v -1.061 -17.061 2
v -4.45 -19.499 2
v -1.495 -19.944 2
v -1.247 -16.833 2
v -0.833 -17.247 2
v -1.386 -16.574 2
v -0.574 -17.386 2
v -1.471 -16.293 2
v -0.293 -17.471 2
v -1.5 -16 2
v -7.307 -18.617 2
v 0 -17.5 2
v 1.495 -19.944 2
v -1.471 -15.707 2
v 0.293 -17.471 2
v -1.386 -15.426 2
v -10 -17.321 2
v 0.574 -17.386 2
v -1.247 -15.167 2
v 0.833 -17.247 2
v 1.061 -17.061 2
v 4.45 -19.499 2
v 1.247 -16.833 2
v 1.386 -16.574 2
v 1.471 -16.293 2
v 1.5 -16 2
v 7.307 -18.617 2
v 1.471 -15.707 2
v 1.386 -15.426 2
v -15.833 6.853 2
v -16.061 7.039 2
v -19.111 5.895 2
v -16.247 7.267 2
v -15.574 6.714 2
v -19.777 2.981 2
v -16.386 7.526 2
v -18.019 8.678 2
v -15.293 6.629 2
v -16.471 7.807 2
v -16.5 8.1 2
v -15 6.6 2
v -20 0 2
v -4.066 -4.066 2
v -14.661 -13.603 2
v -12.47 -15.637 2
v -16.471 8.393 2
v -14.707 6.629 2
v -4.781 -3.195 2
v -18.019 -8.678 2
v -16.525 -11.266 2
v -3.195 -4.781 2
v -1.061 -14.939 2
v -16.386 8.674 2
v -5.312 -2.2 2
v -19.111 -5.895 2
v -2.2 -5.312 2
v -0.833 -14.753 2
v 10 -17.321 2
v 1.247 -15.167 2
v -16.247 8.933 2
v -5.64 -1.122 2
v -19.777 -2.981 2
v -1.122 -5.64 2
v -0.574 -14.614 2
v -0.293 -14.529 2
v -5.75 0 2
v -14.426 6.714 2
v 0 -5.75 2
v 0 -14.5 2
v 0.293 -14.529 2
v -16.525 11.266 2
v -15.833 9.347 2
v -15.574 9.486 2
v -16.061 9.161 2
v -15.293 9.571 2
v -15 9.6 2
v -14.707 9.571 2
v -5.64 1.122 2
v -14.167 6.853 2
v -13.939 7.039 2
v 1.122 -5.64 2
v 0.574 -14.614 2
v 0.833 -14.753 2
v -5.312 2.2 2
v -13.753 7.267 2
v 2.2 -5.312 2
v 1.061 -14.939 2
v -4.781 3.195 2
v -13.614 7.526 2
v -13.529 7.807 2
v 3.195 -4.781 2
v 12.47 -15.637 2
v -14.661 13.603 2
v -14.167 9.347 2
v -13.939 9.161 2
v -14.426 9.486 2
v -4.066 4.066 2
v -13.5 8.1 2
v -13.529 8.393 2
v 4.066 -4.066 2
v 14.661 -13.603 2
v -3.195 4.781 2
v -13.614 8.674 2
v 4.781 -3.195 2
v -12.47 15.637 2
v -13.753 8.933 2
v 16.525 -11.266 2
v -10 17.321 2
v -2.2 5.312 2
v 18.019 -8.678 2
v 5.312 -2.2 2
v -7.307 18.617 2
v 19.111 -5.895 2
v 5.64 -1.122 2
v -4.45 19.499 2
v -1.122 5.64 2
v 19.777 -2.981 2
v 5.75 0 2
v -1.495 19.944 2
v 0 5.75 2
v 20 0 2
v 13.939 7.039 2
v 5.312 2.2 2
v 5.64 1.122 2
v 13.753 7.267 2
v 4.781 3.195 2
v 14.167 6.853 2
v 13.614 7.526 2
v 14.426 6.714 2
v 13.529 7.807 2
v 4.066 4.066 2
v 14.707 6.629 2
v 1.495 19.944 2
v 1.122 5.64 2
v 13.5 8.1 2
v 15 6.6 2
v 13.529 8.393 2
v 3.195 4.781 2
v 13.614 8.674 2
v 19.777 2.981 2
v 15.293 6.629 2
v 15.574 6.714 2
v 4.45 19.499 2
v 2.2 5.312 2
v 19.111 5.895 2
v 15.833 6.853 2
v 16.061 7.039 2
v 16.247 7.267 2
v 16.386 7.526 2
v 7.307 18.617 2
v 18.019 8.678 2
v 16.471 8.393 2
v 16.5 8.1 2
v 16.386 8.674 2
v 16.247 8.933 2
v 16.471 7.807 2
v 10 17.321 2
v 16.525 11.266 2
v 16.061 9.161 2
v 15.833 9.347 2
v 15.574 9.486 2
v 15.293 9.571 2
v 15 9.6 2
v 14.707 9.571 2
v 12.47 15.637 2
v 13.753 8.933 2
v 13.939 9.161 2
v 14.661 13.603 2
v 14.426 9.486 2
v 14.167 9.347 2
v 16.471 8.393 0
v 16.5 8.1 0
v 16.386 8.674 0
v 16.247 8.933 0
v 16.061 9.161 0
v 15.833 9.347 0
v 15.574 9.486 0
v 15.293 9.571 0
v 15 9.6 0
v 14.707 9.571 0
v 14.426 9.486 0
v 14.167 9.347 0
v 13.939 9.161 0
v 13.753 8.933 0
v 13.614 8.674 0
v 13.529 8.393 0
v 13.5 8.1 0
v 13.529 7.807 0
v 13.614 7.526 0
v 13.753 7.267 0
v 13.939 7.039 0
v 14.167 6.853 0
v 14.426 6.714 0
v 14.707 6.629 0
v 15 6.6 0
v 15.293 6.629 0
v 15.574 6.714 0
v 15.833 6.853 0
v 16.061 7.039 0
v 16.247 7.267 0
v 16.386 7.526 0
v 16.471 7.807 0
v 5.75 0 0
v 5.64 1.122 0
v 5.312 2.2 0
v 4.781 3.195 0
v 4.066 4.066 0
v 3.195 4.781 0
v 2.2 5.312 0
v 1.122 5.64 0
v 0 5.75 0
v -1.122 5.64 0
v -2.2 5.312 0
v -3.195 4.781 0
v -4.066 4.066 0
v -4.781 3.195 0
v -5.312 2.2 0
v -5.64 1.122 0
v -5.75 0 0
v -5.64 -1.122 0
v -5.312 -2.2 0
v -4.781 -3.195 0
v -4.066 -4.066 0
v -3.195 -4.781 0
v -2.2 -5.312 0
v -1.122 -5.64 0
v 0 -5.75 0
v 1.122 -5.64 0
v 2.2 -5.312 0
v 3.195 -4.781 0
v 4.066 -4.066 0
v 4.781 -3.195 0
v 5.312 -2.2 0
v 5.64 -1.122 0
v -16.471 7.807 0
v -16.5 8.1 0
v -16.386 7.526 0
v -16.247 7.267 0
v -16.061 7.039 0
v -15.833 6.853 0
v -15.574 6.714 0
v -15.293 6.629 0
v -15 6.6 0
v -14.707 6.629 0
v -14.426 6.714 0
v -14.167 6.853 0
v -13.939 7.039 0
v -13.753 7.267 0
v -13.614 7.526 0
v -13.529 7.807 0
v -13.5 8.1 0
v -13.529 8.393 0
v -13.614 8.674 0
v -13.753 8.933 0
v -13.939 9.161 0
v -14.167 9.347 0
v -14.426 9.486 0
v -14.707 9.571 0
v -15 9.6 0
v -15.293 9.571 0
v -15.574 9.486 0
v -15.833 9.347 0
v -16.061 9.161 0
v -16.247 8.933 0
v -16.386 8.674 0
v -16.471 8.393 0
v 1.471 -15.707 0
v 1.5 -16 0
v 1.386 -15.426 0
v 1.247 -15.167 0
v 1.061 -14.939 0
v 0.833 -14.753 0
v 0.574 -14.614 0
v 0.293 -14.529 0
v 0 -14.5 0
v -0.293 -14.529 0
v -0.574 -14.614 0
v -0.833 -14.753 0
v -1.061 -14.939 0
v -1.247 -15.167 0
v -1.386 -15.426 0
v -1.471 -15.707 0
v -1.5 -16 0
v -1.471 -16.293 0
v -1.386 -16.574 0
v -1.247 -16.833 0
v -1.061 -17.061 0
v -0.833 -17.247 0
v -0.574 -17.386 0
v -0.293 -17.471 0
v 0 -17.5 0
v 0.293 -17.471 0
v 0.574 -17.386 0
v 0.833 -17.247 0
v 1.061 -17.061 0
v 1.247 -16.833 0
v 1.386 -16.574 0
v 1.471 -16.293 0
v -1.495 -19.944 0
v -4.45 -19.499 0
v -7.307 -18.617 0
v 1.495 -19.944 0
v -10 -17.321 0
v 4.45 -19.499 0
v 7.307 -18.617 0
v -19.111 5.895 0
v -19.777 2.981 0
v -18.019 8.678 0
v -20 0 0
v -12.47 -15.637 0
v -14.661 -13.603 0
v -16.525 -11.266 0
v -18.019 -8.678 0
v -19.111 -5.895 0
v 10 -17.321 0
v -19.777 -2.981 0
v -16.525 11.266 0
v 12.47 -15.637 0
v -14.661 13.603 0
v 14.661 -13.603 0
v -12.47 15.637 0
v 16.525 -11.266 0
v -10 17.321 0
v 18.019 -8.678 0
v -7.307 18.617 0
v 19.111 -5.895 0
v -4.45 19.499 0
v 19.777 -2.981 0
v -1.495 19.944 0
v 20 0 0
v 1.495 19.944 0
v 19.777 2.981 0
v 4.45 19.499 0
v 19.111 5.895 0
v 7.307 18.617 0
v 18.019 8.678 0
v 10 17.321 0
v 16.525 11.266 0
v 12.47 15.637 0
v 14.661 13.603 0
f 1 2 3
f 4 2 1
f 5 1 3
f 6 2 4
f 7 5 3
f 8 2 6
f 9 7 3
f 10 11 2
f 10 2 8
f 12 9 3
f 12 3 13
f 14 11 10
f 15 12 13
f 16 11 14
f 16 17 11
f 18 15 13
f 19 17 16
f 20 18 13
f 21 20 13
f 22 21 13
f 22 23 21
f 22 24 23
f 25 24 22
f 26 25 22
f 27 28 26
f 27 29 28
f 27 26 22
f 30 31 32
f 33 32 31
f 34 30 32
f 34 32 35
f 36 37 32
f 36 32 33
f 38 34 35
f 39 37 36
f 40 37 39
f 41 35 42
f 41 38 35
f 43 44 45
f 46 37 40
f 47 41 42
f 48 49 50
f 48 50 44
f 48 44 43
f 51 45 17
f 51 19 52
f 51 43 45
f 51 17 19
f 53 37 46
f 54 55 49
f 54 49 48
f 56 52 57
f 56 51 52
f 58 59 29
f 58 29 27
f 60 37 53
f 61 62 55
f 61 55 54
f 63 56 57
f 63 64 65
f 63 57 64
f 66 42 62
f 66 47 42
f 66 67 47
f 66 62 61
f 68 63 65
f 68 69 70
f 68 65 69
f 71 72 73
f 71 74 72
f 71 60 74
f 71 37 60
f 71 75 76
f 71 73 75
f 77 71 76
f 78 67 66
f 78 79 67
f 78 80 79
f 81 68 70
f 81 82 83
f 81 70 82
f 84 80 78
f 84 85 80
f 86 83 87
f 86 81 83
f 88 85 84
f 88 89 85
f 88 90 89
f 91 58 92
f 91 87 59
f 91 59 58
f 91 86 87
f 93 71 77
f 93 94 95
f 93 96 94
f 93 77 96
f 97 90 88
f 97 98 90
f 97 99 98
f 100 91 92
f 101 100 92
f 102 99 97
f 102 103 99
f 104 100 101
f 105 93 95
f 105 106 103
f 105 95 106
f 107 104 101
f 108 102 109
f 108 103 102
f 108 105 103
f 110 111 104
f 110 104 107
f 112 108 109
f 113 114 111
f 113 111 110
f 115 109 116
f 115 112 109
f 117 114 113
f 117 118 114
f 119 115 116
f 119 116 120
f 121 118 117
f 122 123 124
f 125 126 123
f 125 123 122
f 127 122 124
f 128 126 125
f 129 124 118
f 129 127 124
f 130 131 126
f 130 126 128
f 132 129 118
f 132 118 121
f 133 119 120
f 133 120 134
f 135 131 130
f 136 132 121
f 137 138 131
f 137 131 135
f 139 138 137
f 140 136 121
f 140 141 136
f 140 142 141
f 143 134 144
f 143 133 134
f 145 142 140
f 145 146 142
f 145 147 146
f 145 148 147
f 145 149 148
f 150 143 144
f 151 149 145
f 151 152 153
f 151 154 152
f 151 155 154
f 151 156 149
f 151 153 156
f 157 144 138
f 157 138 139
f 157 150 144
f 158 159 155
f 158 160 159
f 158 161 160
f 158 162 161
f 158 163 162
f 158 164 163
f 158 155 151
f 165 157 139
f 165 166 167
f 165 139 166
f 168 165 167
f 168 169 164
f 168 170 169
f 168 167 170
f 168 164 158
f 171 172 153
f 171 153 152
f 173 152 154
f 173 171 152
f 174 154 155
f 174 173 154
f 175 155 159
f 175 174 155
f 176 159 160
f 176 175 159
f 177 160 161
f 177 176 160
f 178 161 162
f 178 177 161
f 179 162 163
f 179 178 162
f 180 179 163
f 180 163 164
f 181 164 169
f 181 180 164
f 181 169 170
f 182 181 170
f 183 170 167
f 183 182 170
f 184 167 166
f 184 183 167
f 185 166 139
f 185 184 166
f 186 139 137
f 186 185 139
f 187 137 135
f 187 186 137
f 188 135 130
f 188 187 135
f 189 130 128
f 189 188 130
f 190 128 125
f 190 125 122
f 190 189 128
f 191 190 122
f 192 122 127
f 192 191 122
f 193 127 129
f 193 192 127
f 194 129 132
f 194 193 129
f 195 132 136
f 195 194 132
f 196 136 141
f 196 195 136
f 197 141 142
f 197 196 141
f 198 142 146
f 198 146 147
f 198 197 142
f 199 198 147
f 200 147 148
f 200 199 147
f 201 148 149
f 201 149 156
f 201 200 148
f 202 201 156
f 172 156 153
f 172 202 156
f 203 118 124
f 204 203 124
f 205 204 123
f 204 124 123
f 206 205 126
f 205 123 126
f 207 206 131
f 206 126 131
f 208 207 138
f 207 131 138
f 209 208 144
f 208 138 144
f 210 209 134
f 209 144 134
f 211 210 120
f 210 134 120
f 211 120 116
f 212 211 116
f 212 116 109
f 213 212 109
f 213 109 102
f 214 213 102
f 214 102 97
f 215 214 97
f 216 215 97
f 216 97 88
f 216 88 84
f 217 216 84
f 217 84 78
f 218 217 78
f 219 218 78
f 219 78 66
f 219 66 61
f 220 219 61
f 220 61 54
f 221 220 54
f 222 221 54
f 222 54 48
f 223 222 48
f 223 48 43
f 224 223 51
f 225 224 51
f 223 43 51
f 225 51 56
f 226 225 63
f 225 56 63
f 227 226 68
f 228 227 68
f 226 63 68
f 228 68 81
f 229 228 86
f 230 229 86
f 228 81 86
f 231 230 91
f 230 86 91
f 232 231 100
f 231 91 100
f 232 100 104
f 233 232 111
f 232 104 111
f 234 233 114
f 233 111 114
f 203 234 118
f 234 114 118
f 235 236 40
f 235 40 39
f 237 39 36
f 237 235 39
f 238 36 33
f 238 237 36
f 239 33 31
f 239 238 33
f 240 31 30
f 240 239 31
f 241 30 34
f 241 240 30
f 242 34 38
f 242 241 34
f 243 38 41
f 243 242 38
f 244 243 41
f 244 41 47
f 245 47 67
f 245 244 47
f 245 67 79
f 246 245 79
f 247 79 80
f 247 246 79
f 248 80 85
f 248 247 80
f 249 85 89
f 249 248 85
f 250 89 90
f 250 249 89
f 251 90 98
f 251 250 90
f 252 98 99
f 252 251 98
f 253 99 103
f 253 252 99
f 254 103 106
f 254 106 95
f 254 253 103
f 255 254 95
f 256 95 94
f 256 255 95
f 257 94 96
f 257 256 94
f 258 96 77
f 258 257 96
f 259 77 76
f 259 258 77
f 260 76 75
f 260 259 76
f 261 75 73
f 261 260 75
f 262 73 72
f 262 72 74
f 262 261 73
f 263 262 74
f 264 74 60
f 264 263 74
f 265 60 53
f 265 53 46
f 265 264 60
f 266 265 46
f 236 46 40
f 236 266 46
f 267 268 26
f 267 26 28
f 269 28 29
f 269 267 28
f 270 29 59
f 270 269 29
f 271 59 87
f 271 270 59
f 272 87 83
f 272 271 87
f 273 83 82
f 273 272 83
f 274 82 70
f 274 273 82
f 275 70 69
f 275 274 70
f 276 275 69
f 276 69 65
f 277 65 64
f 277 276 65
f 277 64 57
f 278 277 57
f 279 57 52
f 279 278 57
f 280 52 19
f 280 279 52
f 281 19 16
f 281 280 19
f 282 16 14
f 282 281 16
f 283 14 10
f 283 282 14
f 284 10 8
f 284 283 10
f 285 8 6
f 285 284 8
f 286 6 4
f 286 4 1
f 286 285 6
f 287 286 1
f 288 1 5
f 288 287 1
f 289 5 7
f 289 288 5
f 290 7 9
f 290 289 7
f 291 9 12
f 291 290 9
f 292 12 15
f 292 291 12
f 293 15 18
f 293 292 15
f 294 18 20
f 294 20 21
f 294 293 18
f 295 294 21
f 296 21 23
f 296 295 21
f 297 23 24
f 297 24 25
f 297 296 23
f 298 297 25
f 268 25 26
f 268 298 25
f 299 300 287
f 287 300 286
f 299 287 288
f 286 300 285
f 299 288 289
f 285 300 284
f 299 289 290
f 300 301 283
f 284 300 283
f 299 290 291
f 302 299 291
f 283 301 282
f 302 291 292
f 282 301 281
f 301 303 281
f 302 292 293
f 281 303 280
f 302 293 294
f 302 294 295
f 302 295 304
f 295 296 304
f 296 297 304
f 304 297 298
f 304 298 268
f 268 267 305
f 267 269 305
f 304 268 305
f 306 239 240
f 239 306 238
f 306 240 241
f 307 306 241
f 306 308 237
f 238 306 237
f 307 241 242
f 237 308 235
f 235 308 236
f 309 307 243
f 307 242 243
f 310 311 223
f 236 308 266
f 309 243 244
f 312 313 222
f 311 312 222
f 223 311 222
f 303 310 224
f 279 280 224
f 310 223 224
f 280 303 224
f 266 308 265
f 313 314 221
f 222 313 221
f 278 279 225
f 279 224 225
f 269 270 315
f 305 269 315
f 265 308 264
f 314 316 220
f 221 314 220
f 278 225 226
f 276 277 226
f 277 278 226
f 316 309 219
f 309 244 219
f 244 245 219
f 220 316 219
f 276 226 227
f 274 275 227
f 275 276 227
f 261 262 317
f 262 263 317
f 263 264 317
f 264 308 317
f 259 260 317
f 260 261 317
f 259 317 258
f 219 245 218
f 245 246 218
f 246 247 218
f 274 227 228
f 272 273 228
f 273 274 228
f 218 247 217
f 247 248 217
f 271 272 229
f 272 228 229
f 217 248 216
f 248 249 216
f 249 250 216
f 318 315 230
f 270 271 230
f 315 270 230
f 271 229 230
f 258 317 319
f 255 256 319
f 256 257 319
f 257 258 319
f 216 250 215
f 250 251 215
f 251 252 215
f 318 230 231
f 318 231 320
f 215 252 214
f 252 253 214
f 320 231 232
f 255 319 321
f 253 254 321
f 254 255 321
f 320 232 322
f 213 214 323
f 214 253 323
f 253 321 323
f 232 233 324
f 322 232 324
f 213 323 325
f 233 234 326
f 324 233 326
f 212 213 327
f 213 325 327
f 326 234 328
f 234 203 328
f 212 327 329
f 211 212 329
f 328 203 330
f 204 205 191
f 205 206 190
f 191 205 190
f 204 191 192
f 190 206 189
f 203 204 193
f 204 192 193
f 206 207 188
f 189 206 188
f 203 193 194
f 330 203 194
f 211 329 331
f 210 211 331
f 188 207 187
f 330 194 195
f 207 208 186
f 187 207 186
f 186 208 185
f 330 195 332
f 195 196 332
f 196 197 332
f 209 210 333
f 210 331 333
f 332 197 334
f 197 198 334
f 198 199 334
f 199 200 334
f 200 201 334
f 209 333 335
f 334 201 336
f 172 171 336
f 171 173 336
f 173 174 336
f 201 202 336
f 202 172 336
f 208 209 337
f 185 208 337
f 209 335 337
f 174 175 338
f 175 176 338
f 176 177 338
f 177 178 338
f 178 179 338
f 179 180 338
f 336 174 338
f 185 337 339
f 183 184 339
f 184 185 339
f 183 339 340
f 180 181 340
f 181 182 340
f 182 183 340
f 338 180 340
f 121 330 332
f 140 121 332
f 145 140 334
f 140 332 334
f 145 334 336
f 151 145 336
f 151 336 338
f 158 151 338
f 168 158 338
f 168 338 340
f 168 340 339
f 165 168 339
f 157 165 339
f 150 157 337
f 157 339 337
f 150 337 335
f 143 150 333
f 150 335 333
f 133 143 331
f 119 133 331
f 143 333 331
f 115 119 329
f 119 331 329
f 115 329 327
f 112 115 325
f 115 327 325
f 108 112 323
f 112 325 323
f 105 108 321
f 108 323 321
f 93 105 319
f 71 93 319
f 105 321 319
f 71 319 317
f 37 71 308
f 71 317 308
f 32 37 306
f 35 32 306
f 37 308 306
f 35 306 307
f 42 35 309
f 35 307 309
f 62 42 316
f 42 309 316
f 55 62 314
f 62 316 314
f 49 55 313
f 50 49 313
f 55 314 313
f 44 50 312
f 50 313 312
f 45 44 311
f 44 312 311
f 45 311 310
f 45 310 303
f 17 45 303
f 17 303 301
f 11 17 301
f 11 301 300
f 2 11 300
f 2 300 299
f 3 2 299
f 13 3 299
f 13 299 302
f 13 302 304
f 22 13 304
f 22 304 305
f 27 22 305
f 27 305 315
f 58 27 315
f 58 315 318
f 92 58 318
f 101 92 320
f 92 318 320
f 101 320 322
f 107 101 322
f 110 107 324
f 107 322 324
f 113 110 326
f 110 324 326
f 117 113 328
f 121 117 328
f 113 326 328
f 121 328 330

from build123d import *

# Parameters (mm, degrees)
CROQUIS1_R              = 20
CROQUIS1_R_2            = 1.5
SALIENTE_EXTRUIR1_DEPTH = 2
CROQUIS2_R              = 5.75
CORTAR_EXTRUIR1_DEPTH   = 10


with BuildPart() as part:
    # Croquis1 → Saliente-Extruir1 (new body)
    with BuildSketch(Plane.XY):
        Circle(CROQUIS1_R)
        with Locations((15, 8.1)):
            Circle(CROQUIS1_R_2, mode=Mode.SUBTRACT)
        with Locations((0, -16)):
            Circle(CROQUIS1_R_2, mode=Mode.SUBTRACT)
        with Locations(Location((-15, 8.1, 0), (0, 0, 180))):
            Circle(CROQUIS1_R_2, mode=Mode.SUBTRACT)
    extrude(amount=SALIENTE_EXTRUIR1_DEPTH)

    # Croquis2 → Cortar-Extruir1 (cut)
    with BuildSketch(Plane.XY.offset(2)):
        Circle(CROQUIS2_R)
    extrude(amount=-CORTAR_EXTRUIR1_DEPTH, mode=Mode.SUBTRACT)


solid = part.part
